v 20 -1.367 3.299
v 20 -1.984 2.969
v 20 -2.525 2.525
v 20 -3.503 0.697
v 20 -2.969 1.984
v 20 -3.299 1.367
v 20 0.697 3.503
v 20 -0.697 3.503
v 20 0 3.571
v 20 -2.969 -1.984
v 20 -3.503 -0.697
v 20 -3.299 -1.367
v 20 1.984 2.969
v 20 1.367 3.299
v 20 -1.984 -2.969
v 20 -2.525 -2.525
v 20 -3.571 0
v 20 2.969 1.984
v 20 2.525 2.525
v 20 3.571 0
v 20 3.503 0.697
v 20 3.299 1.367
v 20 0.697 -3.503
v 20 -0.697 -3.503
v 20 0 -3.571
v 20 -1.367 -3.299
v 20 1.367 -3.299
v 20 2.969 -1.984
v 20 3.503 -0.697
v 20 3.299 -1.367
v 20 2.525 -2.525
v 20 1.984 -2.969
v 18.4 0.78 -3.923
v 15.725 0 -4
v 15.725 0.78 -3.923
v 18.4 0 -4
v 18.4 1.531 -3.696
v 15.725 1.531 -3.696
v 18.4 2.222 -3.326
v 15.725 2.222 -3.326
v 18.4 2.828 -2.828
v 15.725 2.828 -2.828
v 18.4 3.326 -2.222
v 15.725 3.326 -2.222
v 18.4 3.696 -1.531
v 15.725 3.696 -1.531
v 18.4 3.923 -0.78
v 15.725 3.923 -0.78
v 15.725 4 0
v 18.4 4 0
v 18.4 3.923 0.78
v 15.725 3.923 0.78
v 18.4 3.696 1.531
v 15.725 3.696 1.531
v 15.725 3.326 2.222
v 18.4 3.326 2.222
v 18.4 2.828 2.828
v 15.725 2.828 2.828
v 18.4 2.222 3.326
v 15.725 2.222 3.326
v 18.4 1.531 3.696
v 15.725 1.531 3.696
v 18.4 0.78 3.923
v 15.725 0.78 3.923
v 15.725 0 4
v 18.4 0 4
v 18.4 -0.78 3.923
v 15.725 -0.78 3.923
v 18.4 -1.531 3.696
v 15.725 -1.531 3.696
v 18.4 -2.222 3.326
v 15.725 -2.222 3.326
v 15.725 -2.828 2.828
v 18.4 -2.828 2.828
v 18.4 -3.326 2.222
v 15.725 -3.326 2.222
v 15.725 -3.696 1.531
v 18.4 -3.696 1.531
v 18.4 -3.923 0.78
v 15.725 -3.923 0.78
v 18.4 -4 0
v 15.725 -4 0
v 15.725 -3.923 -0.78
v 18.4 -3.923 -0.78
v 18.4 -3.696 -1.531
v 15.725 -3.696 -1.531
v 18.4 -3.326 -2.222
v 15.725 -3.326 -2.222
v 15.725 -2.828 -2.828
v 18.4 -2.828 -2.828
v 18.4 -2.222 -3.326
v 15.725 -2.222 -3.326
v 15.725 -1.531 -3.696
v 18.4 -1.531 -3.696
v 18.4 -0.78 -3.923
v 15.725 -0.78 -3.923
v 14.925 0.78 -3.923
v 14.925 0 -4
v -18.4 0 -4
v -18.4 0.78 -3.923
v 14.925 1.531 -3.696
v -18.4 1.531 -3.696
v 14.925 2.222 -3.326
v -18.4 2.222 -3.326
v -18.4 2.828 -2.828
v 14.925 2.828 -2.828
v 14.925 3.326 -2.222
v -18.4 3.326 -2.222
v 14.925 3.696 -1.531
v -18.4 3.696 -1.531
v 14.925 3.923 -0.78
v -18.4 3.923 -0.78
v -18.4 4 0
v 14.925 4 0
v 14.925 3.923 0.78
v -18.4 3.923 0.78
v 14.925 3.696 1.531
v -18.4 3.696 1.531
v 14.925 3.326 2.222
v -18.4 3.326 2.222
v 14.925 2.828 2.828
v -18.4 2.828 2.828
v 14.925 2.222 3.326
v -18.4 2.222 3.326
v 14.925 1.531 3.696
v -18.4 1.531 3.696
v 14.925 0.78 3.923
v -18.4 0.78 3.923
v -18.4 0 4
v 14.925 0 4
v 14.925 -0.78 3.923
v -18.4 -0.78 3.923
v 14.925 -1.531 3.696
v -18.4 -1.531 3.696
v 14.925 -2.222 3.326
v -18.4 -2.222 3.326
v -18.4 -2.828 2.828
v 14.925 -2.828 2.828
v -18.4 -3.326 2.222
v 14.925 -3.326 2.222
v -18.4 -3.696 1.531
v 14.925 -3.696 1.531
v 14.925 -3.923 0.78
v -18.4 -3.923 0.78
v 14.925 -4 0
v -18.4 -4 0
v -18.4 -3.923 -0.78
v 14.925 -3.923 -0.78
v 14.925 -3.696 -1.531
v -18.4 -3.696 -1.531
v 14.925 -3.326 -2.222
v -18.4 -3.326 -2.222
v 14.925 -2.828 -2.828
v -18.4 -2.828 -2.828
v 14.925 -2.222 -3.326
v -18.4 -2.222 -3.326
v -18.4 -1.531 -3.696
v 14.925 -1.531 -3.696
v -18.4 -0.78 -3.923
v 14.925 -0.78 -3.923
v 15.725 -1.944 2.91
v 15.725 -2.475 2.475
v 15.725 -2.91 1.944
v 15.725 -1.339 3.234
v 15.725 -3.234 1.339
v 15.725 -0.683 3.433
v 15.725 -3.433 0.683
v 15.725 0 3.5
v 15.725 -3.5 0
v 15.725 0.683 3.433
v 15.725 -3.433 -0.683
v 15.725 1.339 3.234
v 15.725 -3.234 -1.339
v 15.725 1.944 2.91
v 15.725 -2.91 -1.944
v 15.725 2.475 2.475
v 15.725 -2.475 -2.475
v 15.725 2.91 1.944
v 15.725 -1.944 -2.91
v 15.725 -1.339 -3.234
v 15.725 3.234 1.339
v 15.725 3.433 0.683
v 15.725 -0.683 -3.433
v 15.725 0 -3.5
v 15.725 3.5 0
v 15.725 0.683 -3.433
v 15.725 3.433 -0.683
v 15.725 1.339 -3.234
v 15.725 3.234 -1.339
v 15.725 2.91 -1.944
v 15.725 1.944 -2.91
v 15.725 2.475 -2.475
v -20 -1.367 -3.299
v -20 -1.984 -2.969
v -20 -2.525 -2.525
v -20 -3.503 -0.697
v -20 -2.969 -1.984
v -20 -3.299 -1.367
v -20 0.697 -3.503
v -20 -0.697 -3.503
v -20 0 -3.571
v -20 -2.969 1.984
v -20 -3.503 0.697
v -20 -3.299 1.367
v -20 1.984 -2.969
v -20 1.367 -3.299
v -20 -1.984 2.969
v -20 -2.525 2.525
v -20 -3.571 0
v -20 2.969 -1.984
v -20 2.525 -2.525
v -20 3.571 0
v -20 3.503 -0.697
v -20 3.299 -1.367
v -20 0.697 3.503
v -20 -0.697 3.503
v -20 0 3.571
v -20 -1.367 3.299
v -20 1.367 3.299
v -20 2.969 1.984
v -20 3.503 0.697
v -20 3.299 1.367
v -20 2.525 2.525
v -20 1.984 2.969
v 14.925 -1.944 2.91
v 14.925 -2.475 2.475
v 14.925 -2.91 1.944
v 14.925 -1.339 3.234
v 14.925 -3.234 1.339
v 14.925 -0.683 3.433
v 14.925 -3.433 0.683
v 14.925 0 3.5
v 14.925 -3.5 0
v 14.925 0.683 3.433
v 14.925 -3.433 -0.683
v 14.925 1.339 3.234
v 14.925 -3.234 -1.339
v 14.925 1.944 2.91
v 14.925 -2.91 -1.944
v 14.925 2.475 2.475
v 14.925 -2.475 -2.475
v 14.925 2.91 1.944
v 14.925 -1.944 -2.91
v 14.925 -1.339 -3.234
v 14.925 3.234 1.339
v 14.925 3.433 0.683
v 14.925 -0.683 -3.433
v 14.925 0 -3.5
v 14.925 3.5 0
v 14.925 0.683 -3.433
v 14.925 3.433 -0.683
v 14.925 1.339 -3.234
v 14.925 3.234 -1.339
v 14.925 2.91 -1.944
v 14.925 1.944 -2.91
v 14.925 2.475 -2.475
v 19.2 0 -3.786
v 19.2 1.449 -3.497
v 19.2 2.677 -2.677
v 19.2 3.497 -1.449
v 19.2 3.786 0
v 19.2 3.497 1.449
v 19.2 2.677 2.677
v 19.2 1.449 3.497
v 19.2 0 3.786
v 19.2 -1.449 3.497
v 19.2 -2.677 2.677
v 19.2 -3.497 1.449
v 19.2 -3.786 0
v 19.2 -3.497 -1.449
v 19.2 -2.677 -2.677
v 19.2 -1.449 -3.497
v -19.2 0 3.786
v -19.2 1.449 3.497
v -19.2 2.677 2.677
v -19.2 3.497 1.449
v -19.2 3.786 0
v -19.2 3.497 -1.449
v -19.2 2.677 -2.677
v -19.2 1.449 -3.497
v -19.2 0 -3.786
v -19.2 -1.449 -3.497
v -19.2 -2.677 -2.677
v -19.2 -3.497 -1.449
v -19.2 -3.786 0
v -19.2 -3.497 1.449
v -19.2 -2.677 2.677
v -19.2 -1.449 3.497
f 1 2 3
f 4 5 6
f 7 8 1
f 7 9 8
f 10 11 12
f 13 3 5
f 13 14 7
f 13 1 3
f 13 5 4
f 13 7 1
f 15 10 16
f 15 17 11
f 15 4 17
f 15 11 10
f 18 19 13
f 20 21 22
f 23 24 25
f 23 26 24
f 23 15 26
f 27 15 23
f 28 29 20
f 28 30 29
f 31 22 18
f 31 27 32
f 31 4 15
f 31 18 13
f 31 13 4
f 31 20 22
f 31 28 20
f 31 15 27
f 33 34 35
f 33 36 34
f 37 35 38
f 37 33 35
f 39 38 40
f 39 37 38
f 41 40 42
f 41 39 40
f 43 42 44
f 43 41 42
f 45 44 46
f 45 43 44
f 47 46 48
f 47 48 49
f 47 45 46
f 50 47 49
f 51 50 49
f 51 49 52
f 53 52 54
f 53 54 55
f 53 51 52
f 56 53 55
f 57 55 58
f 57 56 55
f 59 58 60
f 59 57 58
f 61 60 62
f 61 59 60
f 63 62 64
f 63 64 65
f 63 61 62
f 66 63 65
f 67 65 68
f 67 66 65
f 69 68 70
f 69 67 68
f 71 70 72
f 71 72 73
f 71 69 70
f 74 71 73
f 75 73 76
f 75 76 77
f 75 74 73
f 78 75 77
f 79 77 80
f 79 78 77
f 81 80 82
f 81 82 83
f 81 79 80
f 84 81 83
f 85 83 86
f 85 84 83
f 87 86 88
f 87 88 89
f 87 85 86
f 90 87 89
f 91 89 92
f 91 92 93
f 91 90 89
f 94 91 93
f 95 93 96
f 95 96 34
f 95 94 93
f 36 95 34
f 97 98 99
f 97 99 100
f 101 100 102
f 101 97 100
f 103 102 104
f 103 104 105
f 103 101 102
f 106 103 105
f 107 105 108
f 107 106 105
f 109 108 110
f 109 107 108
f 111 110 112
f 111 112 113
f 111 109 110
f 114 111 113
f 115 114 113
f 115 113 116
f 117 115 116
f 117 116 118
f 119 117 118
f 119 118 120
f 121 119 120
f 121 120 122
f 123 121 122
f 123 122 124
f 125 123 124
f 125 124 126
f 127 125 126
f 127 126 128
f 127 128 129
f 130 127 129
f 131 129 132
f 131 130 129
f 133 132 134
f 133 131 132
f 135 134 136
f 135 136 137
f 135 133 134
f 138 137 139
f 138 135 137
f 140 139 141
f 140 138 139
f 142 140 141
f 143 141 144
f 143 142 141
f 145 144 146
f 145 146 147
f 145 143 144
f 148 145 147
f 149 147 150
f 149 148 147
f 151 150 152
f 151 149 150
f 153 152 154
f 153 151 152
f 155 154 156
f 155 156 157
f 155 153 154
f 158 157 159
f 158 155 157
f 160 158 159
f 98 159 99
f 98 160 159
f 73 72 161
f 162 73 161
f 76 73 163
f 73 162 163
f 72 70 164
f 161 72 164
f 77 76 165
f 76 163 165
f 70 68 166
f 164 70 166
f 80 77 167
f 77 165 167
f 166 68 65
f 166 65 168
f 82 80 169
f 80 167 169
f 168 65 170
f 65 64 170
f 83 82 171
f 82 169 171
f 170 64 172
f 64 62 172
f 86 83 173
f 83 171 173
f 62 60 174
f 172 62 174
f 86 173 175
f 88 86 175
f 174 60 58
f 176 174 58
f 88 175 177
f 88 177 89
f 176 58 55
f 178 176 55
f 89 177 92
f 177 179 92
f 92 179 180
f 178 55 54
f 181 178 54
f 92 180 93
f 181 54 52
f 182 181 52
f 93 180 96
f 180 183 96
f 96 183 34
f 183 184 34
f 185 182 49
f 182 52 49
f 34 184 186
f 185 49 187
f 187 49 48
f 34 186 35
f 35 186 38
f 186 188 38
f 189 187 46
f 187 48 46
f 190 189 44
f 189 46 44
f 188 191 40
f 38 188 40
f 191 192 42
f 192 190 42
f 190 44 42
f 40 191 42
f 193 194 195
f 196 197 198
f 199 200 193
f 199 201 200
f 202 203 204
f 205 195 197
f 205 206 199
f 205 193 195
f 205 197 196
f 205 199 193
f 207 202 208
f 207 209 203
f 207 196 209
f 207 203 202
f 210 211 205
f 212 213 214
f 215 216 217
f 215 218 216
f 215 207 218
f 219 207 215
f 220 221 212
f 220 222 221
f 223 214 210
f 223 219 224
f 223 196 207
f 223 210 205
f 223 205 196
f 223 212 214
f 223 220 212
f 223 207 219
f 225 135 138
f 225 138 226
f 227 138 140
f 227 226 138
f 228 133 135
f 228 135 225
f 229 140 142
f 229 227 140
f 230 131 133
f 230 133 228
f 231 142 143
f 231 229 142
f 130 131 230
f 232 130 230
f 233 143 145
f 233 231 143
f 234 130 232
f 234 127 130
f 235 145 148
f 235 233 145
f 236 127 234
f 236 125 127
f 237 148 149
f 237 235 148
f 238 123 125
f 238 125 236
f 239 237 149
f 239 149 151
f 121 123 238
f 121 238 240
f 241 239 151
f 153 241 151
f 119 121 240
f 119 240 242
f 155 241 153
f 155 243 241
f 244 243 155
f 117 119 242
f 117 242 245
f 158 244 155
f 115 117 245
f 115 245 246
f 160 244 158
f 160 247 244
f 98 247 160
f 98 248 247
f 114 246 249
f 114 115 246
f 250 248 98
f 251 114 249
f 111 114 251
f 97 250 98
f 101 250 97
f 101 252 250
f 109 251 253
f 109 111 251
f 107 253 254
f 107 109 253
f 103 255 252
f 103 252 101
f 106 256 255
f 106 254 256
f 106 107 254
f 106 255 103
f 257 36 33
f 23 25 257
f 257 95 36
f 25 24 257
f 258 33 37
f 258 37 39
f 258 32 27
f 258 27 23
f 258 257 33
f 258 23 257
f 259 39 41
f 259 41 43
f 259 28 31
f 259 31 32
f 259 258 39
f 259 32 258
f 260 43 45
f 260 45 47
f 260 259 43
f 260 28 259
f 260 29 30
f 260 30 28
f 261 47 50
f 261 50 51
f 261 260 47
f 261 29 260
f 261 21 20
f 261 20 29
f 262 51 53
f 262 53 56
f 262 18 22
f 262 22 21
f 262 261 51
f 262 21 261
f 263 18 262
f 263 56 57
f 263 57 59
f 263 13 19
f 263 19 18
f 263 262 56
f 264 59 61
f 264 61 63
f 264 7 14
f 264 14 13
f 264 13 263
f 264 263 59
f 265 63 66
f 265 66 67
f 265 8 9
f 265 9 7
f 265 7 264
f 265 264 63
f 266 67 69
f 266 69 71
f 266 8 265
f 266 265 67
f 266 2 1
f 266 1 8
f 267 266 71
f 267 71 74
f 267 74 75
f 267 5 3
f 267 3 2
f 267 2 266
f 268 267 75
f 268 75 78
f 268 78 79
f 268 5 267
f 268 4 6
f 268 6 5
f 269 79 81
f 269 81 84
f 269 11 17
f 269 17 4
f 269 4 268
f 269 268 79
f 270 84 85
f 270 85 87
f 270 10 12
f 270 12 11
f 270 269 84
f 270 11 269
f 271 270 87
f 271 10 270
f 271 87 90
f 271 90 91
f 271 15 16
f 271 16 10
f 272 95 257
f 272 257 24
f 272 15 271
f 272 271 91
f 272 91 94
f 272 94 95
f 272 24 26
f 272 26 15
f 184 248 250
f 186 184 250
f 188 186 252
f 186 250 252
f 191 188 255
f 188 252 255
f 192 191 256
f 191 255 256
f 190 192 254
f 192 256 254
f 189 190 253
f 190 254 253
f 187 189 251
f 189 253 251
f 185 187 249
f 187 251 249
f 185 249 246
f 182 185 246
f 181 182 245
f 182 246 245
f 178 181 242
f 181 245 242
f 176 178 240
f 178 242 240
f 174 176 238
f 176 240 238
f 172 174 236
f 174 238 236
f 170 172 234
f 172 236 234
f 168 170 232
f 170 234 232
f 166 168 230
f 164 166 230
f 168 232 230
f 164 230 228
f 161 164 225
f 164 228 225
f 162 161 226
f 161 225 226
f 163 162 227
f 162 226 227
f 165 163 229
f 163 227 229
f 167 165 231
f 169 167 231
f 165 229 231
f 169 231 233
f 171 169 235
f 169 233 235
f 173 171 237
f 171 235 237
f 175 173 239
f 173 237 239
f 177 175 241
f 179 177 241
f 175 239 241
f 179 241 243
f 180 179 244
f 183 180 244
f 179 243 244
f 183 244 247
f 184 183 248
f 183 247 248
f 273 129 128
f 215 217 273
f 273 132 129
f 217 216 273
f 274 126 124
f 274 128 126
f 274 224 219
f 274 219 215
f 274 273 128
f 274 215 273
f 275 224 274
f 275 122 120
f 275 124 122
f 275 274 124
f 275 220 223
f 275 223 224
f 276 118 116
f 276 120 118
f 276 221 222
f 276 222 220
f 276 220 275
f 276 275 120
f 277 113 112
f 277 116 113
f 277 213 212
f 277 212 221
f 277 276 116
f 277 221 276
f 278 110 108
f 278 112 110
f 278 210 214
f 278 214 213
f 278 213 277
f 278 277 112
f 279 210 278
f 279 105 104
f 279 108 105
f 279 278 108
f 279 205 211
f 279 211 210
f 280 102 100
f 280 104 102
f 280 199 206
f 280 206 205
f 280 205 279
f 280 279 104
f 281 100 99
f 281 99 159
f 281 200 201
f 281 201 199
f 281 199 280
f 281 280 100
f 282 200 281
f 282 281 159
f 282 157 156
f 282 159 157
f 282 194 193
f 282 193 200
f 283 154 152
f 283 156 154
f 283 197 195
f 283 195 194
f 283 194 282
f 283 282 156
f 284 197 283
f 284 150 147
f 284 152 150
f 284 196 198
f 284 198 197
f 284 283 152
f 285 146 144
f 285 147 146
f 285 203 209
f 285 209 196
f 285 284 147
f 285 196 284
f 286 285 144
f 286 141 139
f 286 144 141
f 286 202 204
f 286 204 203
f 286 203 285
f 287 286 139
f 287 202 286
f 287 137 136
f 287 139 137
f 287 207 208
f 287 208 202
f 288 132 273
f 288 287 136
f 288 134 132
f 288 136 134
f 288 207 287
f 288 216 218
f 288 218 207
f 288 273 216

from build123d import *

# Parameters (mm, degrees)
SKETCH2_R           = 4
EXTRUDE1_DEPTH      = 18.4
EXTRUDE1_DEPTH_BACK = 18.4
SKETCH3_R           = 4
EXTRUDE2_DEPTH      = 1.6
EXTRUDE2_TAPER      = 15
SKETCH4_R           = 4
EXTRUDE3_DEPTH      = 1.6
EXTRUDE3_TAPER      = 15
SKETCH5_R           = 4
SKETCH5_R_2         = 3.5
CUT_EXTRUDE1_DEPTH  = 0.8


with BuildPart() as part:
    # Sketch2 → Extrude1 (new body, two sides)
    with BuildSketch(Plane(origin=(0, 0, 0), x_dir=(0, 0, -1), z_dir=(1, 0, 0))) as extrude1_sk:
        Circle(SKETCH2_R)
    extrude(amount=EXTRUDE1_DEPTH)
    extrude(extrude1_sk.sketch, amount=-EXTRUDE1_DEPTH_BACK)

    # Sketch3 → Extrude2 (add)
    with BuildSketch(Plane(origin=(18.4, 0, 0), x_dir=(0, 0, -1), z_dir=(1, 0, 0))):
        Circle(SKETCH3_R)
    extrude(amount=EXTRUDE2_DEPTH, taper=EXTRUDE2_TAPER)

    # Sketch4 → Extrude3 (add)
    with BuildSketch(Plane.ZY.offset(18.4)):
        Circle(SKETCH4_R)
    extrude(amount=EXTRUDE3_DEPTH, taper=EXTRUDE3_TAPER)

    # Sketch5 → Cut-Extrude1 (cut)
    with BuildSketch(Plane(origin=(14.92499999, 0, 0), x_dir=(0, 0, -1), z_dir=(1, 0, 0))):
        Circle(SKETCH5_R)
        Circle(SKETCH5_R_2, mode=Mode.SUBTRACT)
    extrude(amount=CUT_EXTRUDE1_DEPTH, mode=Mode.SUBTRACT)


solid = part.part
